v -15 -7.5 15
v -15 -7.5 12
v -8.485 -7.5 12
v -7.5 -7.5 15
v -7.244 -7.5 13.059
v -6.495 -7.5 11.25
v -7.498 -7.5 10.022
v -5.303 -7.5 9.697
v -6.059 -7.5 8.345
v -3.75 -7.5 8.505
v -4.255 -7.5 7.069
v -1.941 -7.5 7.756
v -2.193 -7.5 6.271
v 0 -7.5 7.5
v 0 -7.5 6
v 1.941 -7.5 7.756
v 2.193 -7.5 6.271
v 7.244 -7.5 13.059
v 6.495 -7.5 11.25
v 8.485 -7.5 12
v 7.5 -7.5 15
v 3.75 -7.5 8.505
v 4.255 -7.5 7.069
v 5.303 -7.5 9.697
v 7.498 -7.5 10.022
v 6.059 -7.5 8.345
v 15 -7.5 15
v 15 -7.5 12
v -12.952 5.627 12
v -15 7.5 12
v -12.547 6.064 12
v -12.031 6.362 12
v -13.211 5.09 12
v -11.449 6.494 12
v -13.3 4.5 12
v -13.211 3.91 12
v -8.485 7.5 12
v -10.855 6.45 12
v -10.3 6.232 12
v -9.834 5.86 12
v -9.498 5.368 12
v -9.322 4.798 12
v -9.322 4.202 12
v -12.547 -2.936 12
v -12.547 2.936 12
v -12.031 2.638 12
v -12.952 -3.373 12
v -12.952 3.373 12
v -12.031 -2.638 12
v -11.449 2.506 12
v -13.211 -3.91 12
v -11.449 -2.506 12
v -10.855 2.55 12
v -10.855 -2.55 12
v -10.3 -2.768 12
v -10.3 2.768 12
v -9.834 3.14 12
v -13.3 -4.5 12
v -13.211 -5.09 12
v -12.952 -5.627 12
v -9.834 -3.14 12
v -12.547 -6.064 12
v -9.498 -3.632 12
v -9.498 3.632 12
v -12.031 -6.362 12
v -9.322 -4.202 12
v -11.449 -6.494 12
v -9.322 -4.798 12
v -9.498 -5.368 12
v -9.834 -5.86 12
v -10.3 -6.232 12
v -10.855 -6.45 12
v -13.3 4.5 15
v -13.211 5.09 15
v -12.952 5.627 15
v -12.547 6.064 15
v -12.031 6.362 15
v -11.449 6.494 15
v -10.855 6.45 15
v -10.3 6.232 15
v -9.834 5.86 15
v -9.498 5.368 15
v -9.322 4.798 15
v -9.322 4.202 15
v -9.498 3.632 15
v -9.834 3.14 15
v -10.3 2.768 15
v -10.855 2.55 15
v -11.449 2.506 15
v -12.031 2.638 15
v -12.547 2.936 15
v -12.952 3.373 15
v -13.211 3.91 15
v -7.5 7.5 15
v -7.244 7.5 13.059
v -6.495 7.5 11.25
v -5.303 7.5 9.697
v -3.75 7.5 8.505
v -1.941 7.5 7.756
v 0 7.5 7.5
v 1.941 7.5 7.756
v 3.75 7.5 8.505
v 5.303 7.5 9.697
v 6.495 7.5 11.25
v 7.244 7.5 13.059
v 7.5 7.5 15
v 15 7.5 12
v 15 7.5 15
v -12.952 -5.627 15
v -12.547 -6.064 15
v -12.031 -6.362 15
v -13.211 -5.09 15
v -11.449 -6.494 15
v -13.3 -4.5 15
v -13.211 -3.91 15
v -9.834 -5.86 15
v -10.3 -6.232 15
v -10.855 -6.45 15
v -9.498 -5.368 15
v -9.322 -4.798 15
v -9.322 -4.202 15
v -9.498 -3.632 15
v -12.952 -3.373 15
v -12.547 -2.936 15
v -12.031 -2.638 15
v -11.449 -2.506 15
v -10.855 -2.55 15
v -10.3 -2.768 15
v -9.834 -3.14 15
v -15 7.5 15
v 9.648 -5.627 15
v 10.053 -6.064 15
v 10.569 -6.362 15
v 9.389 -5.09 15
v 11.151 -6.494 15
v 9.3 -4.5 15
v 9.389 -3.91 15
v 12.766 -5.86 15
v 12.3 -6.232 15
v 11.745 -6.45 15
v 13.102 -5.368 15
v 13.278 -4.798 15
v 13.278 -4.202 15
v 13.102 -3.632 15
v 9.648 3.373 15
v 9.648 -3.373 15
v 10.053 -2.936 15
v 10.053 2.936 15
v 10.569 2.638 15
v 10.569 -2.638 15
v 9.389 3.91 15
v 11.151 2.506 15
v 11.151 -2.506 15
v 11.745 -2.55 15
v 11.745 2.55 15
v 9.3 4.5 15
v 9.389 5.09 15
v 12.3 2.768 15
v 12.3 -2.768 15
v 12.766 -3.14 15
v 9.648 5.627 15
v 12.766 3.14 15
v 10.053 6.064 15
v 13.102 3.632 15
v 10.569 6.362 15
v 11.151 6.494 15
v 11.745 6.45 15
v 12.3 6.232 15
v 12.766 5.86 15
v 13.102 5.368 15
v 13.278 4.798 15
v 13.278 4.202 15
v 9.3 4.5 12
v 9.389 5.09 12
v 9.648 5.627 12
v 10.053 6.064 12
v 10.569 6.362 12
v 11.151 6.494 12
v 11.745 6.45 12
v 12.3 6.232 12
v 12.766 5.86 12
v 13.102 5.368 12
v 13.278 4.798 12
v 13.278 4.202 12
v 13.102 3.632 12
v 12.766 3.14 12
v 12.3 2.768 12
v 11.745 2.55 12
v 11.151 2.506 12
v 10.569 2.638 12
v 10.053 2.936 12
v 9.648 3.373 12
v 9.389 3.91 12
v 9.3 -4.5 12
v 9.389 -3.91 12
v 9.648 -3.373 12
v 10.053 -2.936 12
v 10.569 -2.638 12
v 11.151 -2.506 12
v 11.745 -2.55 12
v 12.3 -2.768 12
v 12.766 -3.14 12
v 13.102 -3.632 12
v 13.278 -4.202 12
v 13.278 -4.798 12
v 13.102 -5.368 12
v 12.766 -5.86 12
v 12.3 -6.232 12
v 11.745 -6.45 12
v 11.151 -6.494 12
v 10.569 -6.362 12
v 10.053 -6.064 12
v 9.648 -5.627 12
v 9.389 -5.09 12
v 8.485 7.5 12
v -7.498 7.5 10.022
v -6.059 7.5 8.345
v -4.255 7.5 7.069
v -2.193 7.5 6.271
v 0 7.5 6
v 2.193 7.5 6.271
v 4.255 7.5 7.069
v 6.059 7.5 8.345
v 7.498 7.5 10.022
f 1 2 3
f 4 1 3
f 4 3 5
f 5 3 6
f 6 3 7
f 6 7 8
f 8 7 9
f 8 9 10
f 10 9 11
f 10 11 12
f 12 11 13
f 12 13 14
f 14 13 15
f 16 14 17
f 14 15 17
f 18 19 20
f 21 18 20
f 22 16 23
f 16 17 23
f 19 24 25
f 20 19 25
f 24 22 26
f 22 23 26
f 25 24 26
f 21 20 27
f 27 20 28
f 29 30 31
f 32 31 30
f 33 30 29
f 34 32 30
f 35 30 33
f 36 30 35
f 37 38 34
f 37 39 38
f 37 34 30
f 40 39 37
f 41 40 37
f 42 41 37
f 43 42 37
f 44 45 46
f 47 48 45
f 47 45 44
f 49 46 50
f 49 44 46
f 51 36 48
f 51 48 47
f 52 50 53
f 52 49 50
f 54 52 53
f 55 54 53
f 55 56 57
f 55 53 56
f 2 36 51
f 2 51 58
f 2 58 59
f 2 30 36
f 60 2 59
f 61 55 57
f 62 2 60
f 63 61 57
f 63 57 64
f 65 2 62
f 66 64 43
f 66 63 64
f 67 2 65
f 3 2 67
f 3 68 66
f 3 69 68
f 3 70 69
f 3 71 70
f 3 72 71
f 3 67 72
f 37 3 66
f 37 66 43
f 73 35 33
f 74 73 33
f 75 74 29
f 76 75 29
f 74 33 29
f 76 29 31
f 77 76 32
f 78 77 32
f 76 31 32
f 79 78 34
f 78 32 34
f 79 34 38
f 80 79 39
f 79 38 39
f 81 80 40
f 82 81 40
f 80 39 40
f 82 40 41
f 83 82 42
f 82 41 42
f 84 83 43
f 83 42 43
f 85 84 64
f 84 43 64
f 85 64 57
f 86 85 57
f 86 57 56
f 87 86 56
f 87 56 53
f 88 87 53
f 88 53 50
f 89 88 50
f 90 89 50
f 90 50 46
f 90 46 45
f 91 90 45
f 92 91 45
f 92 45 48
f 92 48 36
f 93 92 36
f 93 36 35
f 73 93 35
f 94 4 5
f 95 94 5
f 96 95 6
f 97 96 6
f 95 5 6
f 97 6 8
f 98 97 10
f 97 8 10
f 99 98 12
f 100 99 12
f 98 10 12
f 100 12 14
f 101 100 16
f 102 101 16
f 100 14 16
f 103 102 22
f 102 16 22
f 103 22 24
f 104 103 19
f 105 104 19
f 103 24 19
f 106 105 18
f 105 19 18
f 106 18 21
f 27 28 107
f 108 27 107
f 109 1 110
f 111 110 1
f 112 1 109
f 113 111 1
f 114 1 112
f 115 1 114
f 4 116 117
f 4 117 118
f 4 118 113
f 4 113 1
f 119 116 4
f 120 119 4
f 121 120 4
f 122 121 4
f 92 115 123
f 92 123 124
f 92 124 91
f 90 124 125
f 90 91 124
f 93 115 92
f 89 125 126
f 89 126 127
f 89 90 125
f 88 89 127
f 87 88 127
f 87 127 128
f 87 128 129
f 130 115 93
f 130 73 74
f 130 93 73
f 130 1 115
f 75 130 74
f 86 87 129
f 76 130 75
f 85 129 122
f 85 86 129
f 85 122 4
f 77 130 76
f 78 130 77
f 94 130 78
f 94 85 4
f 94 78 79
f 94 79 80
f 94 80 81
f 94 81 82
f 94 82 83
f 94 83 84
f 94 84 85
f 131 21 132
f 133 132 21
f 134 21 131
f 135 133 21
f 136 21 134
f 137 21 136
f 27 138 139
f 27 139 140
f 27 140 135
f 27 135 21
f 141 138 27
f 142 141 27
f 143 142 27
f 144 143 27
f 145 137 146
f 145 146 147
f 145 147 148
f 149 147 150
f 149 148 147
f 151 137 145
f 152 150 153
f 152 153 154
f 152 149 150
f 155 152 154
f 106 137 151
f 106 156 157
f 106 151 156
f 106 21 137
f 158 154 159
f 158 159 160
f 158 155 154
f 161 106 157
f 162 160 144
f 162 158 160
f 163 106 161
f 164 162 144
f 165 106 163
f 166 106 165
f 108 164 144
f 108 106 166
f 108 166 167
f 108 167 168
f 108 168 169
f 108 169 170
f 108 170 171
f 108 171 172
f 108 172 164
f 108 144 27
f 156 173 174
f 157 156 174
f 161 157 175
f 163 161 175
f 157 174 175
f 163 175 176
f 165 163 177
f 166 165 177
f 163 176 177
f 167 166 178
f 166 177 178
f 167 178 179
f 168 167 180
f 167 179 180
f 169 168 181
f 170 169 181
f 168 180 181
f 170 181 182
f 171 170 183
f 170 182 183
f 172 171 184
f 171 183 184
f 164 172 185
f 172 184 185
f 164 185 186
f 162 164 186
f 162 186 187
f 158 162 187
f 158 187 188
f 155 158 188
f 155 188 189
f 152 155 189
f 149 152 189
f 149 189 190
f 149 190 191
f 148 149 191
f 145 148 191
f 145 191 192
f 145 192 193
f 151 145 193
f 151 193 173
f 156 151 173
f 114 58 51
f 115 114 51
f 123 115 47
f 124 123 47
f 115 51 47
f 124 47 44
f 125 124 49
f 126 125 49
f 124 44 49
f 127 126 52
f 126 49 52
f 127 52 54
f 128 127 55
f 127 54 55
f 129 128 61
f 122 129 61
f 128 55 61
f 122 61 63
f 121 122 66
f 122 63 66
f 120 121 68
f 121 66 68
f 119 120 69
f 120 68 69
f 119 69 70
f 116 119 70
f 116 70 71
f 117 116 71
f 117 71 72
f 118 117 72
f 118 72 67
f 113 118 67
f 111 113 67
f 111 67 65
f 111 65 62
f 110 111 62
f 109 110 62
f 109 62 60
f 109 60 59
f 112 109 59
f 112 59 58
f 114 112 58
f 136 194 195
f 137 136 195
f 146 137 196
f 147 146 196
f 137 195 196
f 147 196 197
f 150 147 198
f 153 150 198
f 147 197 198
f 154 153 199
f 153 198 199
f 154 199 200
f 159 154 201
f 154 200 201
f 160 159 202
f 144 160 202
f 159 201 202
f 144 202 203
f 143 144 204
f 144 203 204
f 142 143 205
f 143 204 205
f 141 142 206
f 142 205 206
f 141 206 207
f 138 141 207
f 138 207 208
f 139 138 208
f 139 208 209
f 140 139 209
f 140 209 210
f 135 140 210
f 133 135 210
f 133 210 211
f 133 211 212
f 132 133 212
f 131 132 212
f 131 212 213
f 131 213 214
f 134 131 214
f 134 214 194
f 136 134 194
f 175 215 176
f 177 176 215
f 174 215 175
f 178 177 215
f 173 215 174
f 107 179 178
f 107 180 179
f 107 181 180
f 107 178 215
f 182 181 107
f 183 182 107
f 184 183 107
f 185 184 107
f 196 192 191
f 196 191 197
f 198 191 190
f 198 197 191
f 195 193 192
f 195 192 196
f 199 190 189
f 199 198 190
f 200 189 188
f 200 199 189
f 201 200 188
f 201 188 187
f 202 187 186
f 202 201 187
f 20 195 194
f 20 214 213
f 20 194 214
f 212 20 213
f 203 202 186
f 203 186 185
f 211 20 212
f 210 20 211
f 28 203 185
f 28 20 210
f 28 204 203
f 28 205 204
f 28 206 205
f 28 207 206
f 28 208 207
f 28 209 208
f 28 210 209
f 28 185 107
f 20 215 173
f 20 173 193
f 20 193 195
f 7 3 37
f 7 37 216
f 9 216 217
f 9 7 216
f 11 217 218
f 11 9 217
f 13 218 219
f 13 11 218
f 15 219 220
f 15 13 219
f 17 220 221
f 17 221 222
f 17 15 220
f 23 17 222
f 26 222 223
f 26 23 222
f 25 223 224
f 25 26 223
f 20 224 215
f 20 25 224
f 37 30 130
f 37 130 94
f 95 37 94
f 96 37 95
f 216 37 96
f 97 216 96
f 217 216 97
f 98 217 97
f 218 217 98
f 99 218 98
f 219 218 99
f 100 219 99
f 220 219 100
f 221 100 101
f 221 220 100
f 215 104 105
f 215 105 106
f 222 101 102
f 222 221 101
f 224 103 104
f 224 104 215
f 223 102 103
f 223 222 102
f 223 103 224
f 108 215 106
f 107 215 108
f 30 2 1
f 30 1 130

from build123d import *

# Parameters (mm, degrees)
SKETCH1_W           = 30
SKETCH1_H           = 15
BOSS_EXTRUDE1_DEPTH = 15
SKETCH2_R           = 7.5
CUT_EXTRUDE1_DEPTH  = 15
CUT_EXTRUDE2_REACH  = 5
SKETCH3_R           = 2


with BuildPart() as part:
    # Sketch1 → Boss-Extrude1 (new body)
    with BuildSketch(Plane.XY):
        Rectangle(SKETCH1_W, SKETCH1_H)
    extrude(amount=BOSS_EXTRUDE1_DEPTH)

    # Sketch2 → Cut-Extrude1 (cut)
    with BuildSketch(Plane.XZ.offset(7.5)):
        with Locations((0, 15)):
            Circle(SKETCH2_R)
        with BuildLine():
            Line((-15, 12), (-9, 12))
            Line((-9, 12), (-8.485281374, 12))
            ThreePointArc((-8.485281374, 12), (0, 6), (8.485281374, 12))
            Line((8.485281374, 12), (9, 12))
            Line((9, 12), (15, 12))
            Line((15, 12), (15, 0))
            Line((15, 0), (11, 0))
            Line((11, 0), (-11, 0))
            Line((-11, 0), (-15, 0))
            Line((-15, 0), (-15, 12))
        make_face()
    extrude(amount=-CUT_EXTRUDE1_DEPTH, mode=Mode.SUBTRACT)

    # Sketch3 → Cut-Extrude2 (cut, up to next)
    with BuildSketch(Plane(origin=(0, 0, 12), x_dir=(-1, 0, 0), z_dir=(0, 0, -1)), mode=Mode.PRIVATE) as cut_extrude2_sk1:
        with Locations((11.3, -4.5)):
            Circle(SKETCH3_R)
    cut_extrude2_tool1 = extrude(cut_extrude2_sk1.sketch, amount=-CUT_EXTRUDE2_REACH, mode=Mode.PRIVATE) & part.part
    add(cut_extrude2_tool1.solids().sort_by_distance((-11.3, -4.5, 12))[0], mode=Mode.SUBTRACT)
    # Sketch3 → Cut-Extrude2 (cut, up to next)
    with BuildSketch(Plane(origin=(0, 0, 12), x_dir=(-1, 0, 0), z_dir=(0, 0, -1)), mode=Mode.PRIVATE) as cut_extrude2_sk2:
        with Locations((11.3, 4.5)):
            Circle(SKETCH3_R)
    cut_extrude2_tool2 = extrude(cut_extrude2_sk2.sketch, amount=-CUT_EXTRUDE2_REACH, mode=Mode.PRIVATE) & part.part
    add(cut_extrude2_tool2.solids().sort_by_distance((-11.3, 4.5, 12))[0], mode=Mode.SUBTRACT)
    # Sketch3 → Cut-Extrude2 (cut, up to next)
    with BuildSketch(Plane(origin=(0, 0, 12), x_dir=(-1, 0, 0), z_dir=(0, 0, -1)), mode=Mode.PRIVATE) as cut_extrude2_sk3:
        with Locations((-11.3, 4.5)):
            Circle(SKETCH3_R)
    cut_extrude2_tool3 = extrude(cut_extrude2_sk3.sketch, amount=-CUT_EXTRUDE2_REACH, mode=Mode.PRIVATE) & part.part
    add(cut_extrude2_tool3.solids().sort_by_distance((11.3, 4.5, 12))[0], mode=Mode.SUBTRACT)
    # Sketch3 → Cut-Extrude2 (cut, up to next)
    with BuildSketch(Plane(origin=(0, 0, 12), x_dir=(-1, 0, 0), z_dir=(0, 0, -1)), mode=Mode.PRIVATE) as cut_extrude2_sk4:
        with Locations((-11.3, -4.5)):
            Circle(SKETCH3_R)
    cut_extrude2_tool4 = extrude(cut_extrude2_sk4.sketch, amount=-CUT_EXTRUDE2_REACH, mode=Mode.PRIVATE) & part.part
    add(cut_extrude2_tool4.solids().sort_by_distance((11.3, -4.5, 12))[0], mode=Mode.SUBTRACT)


solid = part.part
